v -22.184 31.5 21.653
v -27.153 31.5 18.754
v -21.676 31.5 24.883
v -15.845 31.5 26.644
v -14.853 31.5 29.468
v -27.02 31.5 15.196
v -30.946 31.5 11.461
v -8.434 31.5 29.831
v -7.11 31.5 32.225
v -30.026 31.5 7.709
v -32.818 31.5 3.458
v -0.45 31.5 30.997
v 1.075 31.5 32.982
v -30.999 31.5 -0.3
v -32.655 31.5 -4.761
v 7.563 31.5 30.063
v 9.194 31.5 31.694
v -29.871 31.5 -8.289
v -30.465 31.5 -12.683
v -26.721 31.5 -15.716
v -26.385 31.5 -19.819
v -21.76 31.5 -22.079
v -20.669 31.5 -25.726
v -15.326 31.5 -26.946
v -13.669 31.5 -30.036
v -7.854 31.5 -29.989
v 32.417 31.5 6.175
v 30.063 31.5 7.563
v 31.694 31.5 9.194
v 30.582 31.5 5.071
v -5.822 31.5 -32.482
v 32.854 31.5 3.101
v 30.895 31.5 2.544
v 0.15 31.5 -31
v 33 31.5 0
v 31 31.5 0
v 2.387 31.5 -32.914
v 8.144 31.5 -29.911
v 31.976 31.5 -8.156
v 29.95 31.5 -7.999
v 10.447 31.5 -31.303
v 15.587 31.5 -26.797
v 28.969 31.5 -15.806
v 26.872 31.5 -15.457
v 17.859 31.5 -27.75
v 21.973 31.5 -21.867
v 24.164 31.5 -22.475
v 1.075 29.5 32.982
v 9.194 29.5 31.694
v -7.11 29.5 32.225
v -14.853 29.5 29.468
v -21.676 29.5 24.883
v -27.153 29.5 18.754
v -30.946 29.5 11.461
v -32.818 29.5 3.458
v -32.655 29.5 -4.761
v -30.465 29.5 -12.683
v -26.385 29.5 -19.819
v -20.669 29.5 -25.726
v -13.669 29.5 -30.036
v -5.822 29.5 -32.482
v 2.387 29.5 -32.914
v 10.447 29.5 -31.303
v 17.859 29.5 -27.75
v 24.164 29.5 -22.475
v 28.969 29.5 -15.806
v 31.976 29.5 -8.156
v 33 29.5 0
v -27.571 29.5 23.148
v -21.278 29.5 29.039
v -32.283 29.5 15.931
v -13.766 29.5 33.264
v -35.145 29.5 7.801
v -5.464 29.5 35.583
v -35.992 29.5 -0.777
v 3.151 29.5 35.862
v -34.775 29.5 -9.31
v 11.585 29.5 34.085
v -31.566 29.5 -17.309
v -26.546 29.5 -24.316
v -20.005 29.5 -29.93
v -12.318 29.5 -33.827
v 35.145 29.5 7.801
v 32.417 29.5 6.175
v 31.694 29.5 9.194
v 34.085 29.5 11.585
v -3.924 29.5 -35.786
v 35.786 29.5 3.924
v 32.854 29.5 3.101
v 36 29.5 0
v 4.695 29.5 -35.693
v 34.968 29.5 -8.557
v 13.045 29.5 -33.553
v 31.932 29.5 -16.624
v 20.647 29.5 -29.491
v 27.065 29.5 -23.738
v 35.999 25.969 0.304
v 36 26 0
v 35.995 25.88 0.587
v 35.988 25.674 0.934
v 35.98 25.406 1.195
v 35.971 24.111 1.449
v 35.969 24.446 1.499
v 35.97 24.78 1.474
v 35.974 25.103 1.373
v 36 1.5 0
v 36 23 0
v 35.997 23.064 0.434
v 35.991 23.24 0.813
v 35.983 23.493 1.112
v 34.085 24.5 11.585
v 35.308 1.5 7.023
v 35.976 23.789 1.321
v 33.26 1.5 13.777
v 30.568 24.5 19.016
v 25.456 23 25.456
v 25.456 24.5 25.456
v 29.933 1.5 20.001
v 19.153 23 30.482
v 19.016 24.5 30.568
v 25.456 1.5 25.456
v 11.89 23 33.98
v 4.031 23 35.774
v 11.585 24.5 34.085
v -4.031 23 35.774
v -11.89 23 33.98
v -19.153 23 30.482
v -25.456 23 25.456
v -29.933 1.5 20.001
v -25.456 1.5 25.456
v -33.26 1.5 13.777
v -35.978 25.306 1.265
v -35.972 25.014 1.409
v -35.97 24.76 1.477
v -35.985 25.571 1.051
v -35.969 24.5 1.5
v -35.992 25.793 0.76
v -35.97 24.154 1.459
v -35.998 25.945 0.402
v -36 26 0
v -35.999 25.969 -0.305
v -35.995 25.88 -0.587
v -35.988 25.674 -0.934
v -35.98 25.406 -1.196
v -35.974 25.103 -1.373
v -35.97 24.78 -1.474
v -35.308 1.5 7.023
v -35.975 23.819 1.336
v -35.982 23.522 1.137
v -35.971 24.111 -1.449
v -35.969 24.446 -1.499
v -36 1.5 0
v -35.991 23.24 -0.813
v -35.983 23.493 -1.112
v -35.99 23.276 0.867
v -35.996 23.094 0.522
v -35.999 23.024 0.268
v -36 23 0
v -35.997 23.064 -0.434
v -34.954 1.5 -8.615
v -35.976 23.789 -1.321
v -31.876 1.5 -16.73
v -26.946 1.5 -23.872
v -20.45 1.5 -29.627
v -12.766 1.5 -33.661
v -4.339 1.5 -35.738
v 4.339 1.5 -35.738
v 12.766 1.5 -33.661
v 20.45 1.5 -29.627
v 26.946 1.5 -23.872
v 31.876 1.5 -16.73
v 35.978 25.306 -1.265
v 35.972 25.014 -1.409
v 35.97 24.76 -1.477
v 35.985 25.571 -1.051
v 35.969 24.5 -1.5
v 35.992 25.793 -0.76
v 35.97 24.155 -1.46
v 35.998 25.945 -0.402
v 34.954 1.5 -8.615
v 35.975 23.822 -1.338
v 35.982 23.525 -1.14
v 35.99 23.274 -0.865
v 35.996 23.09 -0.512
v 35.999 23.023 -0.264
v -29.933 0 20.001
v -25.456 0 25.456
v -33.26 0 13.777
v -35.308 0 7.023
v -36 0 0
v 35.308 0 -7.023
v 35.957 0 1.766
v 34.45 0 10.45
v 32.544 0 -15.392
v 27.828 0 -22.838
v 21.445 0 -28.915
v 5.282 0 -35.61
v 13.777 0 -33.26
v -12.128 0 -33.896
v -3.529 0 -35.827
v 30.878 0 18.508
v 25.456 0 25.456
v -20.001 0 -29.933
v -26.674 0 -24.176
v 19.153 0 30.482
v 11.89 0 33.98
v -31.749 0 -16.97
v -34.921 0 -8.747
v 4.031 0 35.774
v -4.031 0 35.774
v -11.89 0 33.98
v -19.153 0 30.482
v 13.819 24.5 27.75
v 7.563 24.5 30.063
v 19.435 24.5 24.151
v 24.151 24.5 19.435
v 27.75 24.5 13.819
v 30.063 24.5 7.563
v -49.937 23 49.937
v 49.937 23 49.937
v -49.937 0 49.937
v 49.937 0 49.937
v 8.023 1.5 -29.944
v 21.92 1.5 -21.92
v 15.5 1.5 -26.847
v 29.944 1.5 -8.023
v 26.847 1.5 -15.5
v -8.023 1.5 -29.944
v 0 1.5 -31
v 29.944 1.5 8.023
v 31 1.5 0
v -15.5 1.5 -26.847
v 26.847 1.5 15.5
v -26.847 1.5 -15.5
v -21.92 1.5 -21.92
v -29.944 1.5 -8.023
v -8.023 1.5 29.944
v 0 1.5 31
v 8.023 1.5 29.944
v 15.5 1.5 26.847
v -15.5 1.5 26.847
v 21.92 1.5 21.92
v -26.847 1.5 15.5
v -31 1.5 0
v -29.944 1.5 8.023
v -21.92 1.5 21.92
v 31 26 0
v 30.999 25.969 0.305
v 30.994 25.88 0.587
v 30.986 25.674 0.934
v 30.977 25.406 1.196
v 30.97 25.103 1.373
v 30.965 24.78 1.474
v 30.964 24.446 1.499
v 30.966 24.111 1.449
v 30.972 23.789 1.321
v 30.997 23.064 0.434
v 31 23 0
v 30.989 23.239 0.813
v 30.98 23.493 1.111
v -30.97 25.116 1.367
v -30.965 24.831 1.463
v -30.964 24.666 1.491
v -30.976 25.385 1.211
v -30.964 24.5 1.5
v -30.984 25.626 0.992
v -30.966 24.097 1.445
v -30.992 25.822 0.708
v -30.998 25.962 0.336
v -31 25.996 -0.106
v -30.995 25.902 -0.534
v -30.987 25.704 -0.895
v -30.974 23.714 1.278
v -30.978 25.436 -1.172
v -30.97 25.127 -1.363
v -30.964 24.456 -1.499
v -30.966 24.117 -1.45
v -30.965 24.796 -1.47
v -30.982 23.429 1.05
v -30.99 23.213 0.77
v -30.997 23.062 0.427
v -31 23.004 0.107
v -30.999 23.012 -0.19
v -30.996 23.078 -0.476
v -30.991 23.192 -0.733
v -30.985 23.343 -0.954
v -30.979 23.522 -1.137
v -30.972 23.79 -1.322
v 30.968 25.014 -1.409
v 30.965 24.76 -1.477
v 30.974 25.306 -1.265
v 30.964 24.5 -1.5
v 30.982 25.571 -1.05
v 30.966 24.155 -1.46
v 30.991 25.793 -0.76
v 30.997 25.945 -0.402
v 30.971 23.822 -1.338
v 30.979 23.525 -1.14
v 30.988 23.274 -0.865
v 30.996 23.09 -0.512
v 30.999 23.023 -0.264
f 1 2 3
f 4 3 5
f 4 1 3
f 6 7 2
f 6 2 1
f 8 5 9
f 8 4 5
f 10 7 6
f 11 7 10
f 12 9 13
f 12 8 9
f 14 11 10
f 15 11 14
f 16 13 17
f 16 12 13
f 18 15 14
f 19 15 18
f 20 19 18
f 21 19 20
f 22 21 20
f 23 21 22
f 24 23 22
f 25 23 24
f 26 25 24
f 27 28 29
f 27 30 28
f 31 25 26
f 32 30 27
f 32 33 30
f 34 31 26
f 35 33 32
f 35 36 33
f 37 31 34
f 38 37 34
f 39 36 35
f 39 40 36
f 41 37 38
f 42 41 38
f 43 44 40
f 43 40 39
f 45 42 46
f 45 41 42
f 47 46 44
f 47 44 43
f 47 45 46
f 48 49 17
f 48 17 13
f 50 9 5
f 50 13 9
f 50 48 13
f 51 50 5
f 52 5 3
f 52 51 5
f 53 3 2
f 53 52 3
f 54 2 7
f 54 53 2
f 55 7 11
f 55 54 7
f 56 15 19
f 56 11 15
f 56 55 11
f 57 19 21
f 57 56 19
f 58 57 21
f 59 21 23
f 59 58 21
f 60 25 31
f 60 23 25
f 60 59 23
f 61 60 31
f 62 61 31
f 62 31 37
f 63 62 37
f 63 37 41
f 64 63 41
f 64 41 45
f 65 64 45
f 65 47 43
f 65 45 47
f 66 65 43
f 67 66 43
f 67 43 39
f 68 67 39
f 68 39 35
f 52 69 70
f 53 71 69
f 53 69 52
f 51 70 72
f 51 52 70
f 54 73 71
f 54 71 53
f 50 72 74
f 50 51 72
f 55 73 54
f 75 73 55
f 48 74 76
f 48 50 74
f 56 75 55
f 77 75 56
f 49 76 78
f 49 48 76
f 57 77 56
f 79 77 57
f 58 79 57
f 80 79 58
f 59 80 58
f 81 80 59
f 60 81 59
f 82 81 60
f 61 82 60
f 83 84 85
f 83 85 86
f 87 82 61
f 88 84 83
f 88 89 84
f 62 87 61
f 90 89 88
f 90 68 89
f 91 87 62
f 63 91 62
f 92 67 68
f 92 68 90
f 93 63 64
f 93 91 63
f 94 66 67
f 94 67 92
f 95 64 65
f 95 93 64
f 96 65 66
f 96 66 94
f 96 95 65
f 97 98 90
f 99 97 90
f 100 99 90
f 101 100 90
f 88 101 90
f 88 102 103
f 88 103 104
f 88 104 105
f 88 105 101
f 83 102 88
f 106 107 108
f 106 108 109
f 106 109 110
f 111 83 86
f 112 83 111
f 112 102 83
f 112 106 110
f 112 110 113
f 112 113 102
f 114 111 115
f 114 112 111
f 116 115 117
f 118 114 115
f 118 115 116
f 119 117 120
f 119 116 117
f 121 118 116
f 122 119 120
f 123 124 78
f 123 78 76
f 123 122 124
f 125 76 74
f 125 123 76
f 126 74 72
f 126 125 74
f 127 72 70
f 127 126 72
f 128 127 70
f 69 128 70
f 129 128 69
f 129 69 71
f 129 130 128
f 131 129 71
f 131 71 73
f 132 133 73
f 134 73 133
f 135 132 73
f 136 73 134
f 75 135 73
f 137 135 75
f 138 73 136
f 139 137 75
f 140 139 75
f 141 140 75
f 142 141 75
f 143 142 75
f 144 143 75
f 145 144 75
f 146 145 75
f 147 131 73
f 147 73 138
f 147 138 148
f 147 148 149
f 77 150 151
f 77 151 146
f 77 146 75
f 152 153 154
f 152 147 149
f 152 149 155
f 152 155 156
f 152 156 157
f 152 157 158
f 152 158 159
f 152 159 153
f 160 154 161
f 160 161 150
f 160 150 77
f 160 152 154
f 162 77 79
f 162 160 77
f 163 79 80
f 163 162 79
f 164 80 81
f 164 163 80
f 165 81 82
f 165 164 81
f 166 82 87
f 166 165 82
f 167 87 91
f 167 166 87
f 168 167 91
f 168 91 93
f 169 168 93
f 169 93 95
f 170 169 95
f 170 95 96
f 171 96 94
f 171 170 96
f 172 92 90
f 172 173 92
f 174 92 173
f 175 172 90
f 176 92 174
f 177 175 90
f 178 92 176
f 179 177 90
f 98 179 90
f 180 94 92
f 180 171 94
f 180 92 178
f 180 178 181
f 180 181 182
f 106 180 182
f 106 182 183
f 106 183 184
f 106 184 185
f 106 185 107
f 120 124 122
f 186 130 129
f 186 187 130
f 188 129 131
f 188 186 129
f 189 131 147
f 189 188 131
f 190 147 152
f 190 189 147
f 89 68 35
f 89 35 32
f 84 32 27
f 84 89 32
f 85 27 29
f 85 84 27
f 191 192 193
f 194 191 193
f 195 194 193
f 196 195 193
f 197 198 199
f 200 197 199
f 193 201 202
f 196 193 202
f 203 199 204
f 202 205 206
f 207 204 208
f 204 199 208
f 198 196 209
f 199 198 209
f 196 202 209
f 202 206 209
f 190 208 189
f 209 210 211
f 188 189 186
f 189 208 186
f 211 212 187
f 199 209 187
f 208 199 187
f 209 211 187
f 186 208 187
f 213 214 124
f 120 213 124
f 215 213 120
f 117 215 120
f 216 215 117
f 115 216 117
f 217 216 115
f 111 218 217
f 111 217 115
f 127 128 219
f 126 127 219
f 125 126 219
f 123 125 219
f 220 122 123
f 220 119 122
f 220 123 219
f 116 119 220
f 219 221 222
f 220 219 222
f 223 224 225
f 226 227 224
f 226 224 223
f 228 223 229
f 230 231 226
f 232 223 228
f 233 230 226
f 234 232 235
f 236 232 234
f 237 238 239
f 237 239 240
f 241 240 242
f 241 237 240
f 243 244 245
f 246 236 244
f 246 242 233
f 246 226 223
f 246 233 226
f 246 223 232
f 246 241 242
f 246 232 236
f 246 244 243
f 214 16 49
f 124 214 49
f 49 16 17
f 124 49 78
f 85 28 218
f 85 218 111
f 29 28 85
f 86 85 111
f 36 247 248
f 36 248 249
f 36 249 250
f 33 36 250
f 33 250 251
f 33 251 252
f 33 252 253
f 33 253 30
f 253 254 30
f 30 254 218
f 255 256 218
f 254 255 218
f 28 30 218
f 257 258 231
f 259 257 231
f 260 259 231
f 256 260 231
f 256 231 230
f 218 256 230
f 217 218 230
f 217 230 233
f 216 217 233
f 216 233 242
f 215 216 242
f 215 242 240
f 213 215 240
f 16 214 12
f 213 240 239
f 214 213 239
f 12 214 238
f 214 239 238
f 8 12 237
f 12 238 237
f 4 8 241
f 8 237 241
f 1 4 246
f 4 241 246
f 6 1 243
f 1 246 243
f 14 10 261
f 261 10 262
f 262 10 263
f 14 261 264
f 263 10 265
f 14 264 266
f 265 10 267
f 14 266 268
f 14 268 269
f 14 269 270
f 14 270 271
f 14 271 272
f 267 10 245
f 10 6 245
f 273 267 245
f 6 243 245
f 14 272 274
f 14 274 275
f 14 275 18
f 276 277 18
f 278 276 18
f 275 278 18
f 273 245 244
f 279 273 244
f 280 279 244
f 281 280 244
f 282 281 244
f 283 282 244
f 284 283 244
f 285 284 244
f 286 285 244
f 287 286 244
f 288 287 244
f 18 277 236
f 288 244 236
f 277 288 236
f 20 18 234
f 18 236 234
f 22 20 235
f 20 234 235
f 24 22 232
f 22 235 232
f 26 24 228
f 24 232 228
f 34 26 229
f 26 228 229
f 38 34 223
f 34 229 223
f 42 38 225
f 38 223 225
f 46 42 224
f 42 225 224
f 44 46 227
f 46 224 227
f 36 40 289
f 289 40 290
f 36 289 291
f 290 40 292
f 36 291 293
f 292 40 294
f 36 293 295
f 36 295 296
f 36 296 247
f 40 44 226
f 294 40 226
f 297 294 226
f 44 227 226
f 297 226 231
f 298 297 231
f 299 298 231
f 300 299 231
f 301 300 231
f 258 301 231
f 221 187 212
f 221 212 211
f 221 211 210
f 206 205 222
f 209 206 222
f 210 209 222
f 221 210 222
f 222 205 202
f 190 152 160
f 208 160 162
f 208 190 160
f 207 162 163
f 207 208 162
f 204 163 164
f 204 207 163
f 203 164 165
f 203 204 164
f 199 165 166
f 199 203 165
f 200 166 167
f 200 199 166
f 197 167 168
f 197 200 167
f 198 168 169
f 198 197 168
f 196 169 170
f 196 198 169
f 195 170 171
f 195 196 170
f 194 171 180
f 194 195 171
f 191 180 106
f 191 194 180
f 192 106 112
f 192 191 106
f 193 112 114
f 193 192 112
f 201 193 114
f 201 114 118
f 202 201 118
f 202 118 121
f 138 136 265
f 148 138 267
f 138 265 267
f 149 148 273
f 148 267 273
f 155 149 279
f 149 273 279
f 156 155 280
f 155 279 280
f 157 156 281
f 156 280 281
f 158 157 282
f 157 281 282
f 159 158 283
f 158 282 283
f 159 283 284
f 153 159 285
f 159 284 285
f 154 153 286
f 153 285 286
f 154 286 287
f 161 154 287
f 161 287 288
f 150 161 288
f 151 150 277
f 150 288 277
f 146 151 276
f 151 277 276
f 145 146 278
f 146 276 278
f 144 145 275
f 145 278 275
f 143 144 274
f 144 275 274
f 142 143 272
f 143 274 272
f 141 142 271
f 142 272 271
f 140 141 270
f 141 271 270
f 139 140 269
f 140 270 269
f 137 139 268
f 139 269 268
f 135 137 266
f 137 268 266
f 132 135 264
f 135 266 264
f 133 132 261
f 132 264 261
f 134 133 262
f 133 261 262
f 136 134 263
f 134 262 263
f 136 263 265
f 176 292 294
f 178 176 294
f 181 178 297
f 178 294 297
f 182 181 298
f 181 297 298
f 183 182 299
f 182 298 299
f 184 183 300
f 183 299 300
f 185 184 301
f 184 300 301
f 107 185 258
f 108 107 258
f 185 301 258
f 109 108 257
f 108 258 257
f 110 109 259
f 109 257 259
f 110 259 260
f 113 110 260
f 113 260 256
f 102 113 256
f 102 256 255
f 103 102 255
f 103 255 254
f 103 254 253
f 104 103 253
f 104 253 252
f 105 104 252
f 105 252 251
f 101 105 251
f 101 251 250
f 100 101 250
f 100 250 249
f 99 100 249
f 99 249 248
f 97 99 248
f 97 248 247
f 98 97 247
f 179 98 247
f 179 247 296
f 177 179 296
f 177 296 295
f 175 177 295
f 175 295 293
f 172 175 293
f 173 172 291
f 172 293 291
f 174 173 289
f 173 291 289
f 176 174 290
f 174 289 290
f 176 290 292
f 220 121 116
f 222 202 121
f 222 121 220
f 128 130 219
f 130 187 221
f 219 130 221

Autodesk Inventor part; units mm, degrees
ref_plane "XZ Plane" through (0, 0, 0) normal (0, 1, 0) x (-1, 0, 0)
ref_plane "XY Plane" through (0, 0, 0) normal (0, 0, 1) x (1, 0, 0)
sketch "Sketch1" plane through (0, 0, 0) normal (0, 1, 0) x (-1, 0, 0)
  circle A0 centre (0, 0) radius 36
  dimension "d0" = 72
extrude "Extrusion1" add sketch "Sketch1" along normal blind 1.5
sketch "Sketch2" plane through (0, 1.5, 0) normal (0, 1, 0) x (1, 0, 0)
  circle A0 centre (0, 0) radius 36 projected
  circle A1 centre (0, 0) radius 33
  circle A2 centre (0, 0) radius 31
  dimension "d3" = 3
  dimension "d4" = 2
  dimension "d23" = 72
  dimension "d24" = 66
  dimension "d25" = 62
extrude "Extrusion2" add sketch "Sketch2" along normal blind 30 contours A1
sketch "Sketch3" plane through (0, 1.5, 0) normal (0, 1, 0) x (1, 0, 0)
  circle A0 centre (0, 0) radius 36 projected
  circle A1 centre (0, 0) radius 33 projected
  dimension "d51" = 72
  dimension "d52" = 66
extrude "Extrusion3" add sketch "Sketch3" along normal blind 28
sketch "Sketch5" plane through (0, 31.5, 0) normal (0, 1, 0) x (1, 0, 0)
  circle A0 centre (0, 0) radius 22.5
  line L0 (-22.5, 0) -> (7.2195, 0) construction
  line L1 (0, -22.5) -> (23.761, -22.5) construction
  line L2 (22.5, 0) -> (0, -22.5)
  line L3 (0, -22.5) -> (19.2037, -41.7037)
  line L4 (0, -22.5) -> (27.1581, -22.5) construction
  line L5 (22.5, 0) -> (46.5776, -24.0776)
  line L6 (22.5, 0) -> (56.5508, 0) construction
  line L7 (46.5776, -24.0776) -> (19.2037, -41.7037)
  dimension "d13" = 45
  dimension "d18" = 45
  dimension "d19" = 45
extrude "Extrusion4" cut sketch "Sketch5" against normal blind 7 contours L5 L7 L3 A0 | A0 L2 picked at (12.1762, -13.3637)
ref_plane "Work Plane1" through (-36, 0, 0) normal (1, 0, 0) x (0, 1, 0)
sketch "Sketch7" plane through (-36, 0, 0) normal (1, 0, 0) x (0, 1, 0)
  circle A0 centre (24.5, 0) radius 1.5
  line L0 (29.5, -36) -> (29.5, 36) projected
  point P0 (0, 0)
  point P1 (29.5, 11.585)
  point P2 (29.5, 34.085)
  dimension "d26" = 3
  dimension "d27" = 5
hole "Hole1" at (-36, 24.5, 0) direction (1, 0, 0) diameter 3 depth 8 tip angle 118
ref_plane "Work Plane2" through (36, 0, 0) normal (1, 0, 0) x (0, 1, 0)
sketch "Sketch8" plane through (36, 0, 0) normal (1, 0, 0) x (0, 1, 0)
  circle A0 centre (24.5, 0) radius 1.5
  line L0 (29.5, -36) -> (29.5, 36) projected
  point P0 (0, 0)
  point P1 (29.5, 11.585)
  point P2 (29.5, 34.085)
  dimension "d42" = 3
  dimension "d43" = 5
hole "Hole2" at (36, 24.5, 0) direction (-1, 0, 0) diameter 3 depth 8 tip angle 118
sketch "Sketch10" plane through (0, 1.5, 0) normal (0, 1, 0) x (1, 0, 0)
  line L0 (0, 0) -> (0, -50)
  line L1 (0, 0) -> (49.9372, -49.9372)
  line L2 (0, 0) -> (70.6219, 0) construction
  line L3 (0, 0) -> (-49.9372, -49.9372)
  line L4 (0, 0) -> (70.6219, 0) construction
  circle A0 centre (0, 0) radius 36 projected
  line L5 (-49.9372, -49.9372) -> (49.9372, -49.9372)
  point P0 (-25.4558, -25.4558)
  point P1 (25.4558, -25.4558)
  dimension "d44" = 50
  dimension "d45" = 45
  dimension "d46" = 135
extrude "Extrusion5" add sketch "Sketch10" along normal blind 21.5 and the other way blind 1.5 contours A0 L1 L5 L0 | L0 L5 L3 A0
properties part number "clock_case_bottom"
